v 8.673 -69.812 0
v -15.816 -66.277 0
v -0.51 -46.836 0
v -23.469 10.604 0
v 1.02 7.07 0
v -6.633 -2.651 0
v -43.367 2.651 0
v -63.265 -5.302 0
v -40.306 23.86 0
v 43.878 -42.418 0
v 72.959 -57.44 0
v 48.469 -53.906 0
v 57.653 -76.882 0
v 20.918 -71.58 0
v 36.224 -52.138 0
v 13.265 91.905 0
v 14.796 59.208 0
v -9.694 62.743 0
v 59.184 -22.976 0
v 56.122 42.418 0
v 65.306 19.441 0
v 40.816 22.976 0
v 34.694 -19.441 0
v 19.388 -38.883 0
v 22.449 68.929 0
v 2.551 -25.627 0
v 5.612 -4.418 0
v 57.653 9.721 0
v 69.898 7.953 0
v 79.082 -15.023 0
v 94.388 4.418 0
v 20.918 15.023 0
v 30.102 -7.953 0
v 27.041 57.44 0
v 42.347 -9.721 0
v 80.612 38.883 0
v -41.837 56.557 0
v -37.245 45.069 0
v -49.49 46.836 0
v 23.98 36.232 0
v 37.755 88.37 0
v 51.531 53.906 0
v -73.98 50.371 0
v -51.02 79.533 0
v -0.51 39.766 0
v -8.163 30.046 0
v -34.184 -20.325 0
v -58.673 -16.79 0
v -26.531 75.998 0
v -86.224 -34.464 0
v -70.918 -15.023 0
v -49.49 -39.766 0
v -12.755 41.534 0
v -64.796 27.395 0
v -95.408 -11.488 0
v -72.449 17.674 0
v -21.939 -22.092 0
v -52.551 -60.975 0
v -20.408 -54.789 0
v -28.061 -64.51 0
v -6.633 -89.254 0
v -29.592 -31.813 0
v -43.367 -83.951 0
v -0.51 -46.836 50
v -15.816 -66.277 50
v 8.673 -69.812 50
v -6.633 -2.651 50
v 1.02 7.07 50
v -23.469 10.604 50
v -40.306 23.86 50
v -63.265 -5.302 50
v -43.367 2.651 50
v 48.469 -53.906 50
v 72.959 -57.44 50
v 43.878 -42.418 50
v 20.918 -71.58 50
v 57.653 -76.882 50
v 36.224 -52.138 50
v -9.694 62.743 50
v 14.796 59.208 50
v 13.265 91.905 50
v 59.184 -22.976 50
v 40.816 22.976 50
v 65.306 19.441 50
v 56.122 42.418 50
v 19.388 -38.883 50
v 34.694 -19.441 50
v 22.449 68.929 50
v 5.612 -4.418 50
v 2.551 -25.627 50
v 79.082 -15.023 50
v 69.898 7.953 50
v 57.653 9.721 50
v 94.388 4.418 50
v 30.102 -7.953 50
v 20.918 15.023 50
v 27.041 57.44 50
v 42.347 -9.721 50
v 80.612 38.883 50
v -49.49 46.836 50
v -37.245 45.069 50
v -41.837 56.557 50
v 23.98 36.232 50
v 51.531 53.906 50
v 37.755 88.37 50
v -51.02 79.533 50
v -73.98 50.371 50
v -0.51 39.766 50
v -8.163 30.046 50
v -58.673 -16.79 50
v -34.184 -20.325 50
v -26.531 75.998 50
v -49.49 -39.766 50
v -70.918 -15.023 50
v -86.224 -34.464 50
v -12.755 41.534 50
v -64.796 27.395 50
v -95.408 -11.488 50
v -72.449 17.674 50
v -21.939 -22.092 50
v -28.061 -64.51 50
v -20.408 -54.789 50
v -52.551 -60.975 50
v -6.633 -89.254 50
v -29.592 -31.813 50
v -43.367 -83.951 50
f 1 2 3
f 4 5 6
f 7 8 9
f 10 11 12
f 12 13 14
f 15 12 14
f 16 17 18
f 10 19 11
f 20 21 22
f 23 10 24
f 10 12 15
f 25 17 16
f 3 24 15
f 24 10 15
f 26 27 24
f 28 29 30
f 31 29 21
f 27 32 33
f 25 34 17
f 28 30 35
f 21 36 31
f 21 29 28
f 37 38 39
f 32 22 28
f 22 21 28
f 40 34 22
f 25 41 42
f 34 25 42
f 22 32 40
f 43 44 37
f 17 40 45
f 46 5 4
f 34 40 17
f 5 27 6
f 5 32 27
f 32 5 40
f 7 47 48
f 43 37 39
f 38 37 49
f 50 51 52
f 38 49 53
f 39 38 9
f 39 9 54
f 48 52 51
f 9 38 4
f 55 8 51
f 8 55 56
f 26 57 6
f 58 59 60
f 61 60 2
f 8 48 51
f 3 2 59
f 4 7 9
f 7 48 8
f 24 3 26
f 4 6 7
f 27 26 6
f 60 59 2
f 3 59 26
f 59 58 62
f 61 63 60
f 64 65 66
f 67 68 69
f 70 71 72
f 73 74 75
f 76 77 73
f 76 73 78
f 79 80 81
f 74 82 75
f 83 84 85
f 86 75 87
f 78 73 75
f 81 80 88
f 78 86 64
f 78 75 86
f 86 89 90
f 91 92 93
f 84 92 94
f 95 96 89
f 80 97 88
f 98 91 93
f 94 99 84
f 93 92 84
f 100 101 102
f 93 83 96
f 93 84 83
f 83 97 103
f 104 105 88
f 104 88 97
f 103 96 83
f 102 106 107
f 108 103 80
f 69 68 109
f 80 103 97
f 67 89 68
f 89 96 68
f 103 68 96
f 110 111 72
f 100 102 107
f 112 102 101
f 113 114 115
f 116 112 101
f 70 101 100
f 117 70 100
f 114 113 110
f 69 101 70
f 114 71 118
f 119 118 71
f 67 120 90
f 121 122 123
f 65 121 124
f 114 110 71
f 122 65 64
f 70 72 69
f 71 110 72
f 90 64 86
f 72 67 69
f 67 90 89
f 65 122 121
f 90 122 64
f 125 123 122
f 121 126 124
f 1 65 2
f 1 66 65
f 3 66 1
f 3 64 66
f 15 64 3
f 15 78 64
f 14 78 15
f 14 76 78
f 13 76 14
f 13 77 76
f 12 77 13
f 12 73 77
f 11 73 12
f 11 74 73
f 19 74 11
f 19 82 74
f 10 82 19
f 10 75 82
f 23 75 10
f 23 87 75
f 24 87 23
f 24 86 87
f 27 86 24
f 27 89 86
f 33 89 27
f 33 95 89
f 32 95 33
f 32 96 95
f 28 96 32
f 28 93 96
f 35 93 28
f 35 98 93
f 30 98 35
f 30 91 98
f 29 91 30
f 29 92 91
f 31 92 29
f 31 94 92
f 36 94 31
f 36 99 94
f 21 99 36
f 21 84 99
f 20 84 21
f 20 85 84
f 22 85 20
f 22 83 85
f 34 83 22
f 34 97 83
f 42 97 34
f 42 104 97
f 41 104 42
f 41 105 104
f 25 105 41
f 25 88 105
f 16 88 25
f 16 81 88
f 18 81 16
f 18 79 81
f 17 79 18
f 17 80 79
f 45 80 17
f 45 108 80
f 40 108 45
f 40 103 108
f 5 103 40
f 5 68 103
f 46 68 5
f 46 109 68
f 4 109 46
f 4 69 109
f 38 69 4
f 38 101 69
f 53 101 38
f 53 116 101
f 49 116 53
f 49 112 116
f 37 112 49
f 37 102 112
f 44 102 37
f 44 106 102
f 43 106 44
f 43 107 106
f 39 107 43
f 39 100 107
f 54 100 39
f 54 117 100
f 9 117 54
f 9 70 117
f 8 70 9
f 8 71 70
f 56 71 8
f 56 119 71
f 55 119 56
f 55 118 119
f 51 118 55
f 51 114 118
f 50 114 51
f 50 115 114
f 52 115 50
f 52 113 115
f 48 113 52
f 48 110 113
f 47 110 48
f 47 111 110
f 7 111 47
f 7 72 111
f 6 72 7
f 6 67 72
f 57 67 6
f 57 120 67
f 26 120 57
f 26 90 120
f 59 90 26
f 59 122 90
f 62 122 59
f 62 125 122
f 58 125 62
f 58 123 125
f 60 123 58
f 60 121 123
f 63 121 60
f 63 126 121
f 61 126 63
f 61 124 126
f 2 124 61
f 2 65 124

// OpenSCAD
linear_extrude(height = 50) {
	polygon(paths = [[0, 1, 2, 3, 4, 5, 6, 7, 8, 9, 10, 11, 12, 13, 14, 15, 16, 17, 18, 19, 20, 21, 22, 23, 24, 25, 26, 27, 28, 29, 30, 31, 32, 33, 34, 35, 36, 37, 38, 39, 40, 41, 42, 43, 44, 45, 46, 47, 48, 49, 50, 51, 52, 53, 54, 55, 56, 57, 58, 59, 60, 61, 62, 63, 64, 65, 66, 67, 68, 69, 70, 71, 72, 73, 74, 75, 76, 77, 78, 79, 80, 81, 82, 83, 84, 85, 86, 87, 88, 89, 90, 91, 92, 93, 94, 95, 96, 97, 98, 99, 100, 101, 102, 103, 104, 105, 106, 107, 108, 109, 110, 111, 112, 113, 114, 115, 116, 117, 118, 119, 120, 121, 122, 123, 124, 125, 126, 127, 128, 129, 130, 131, 132, 133, 134, 135, 136, 137, 138, 139, 140, 141, 142, 143, 144, 145, 146]], points = [[50.0, 0.0], [42.34693877551021, -9.720693307784508], [66.83673469387755, -13.255490874251604], [66.83673469387755, -13.255490874251604], [79.0816326530612, -15.02288965748515], [69.89795918367345, 7.953294524550962], [82.14285714285711, 6.185895741317415], [82.14285714285712, 6.185895741317415], [94.3877551020408, 4.418496958083866], [85.20408163265304, 27.394681140119985], [85.20408163265304, 27.394681140119985], [80.61224489795917, 38.882773231138046], [65.3061224489796, 19.441386615569023], [60.71428571428572, 30.929478706587084], [60.7142857142857, 30.929478706587094], [56.12244897959183, 42.41757079760515], [40.816326530612244, 22.97618418203613], [36.22448979591837, 34.46427627305419], [36.22448979591837, 34.46427627305419], [27.04081632653062, 57.4404604550903], [39.28571428571429, 55.67306167185676], [39.28571428571429, 55.67306167185676], [51.530612244897966, 53.90566288862322], [42.3469387755102, 76.88184707065933], [42.3469387755102, 76.88184707065933], [37.75510204081633, 88.3699391616774], [22.448979591836743, 68.92855254610836], [17.857142857142865, 80.41664463712644], [17.857142857142865, 80.41664463712644], [13.265306122448992, 91.9047367281445], [-2.0408163265305976, 72.46335011257547], [-2.0408163265305976, 72.46335011257547], [-9.69387755102039, 62.74265680479096], [14.795918367346944, 59.207859238323856], [7.142857142857151, 49.48716593053935], [7.142857142857151, 49.48716593053934], [-0.5102040816326425, 39.766472622754826], [23.97959183673469, 36.231675056287735], [16.3265306122449, 26.51098174850322], [16.3265306122449, 26.51098174850322], [1.0204081632653128, 7.0695951329341975], [-3.5714285714285614, 18.557687223952257], [-3.5714285714285614, 18.55768722395226], [-8.163265306122442, 30.04577931497032], [-23.469387755102026, 10.604392699401293], [-28.061224489795904, 22.092484790419356], [-28.061224489795904, 22.092484790419356], [-37.24489795918367, 45.068668972455484], [-24.999999999999993, 43.30127018922193], [-24.99999999999999, 43.30127018922194], [-12.755102040816329, 41.533871405988386], [-21.938775510204067, 64.5100555880245], [-21.938775510204067, 64.5100555880245], [-26.530612244897945, 75.99814767904256], [-41.83673469387752, 56.55676106347354], [-46.428571428571395, 68.0448531544916], [-46.4285714285714, 68.0448531544916], [-51.02040816326527, 79.53294524550967], [-66.32653061224487, 60.09155862994064], [-66.32653061224487, 60.09155862994064], [-73.97959183673466, 50.37086532215614], [-49.48979591836733, 46.836067755689044], [-57.14285714285713, 37.115374447904536], [-57.14285714285712, 37.1153744479045], [-64.79591836734693, 27.394681140120014], [-40.306122448979586, 23.85988357365291], [-47.95918367346938, 14.1391902658684], [-47.95918367346938, 14.1391902658684], [-63.26530612244897, -5.302196349700616], [-67.85714285714285, 6.185895741317443], [-67.85714285714285, 6.185895741317443], [-72.44897959183673, 17.673987832335502], [-87.75510204081631, -1.7673987832335203], [-87.75510204081631, -1.7673987832335203], [-95.4081632653061, -11.488092091018027], [-70.91836734693877, -15.022889657485127], [-78.57142857142857, -24.743582965269646], [-78.57142857142857, -24.74358296526965], [-86.22448979591837, -34.46427627305415], [-61.73469387755103, -37.99907383952126], [-61.73469387755103, -37.99907383952126], [-49.489795918367356, -39.766472622754804], [-58.673469387755105, -16.790288440718687], [-46.42857142857144, -18.55768722395224], [-46.42857142857142, -18.557687223952232], [-34.18367346938776, -20.32508600718578], [-43.3673469387755, 2.651098174850336], [-31.122448979591834, 0.8836993916167823], [-31.122448979591834, 0.8836993916167823], [-6.632653061224497, -2.6510981748503175], [-14.285714285714294, -12.371791482634825], [-14.285714285714295, -12.371791482634826], [-21.93877551020409, -22.09248479041934], [2.551020408163249, -25.62728235688644], [-5.102040816326547, -35.34797566467095], [-5.102040816326547, -35.34797566467095], [-20.408163265306143, -54.789362280239985], [-25.00000000000001, -43.30127018922192], [-25.00000000000002, -43.30127018922192], [-29.591836734693892, -31.813178098203863], [-44.897959183673485, -51.254564713772865], [-44.897959183673485, -51.254564713772865], [-52.551020408163275, -60.97525802155738], [-28.06122448979595, -64.51005558802447], [-35.714285714285744, -74.23074889580899], [-35.71428571428575, -74.230748895809], [-43.367346938775555, -83.9514422035935], [-18.877551020408216, -87.4862397700606], [-18.877551020408216, -87.4862397700606], [-6.632653061224541, -89.25363855329415], [-15.816326530612287, -66.27745437125805], [-3.57142857142862, -68.0448531544916], [-3.571428571428603, -68.04485315449158], [8.673469387755068, -69.81225193772515], [-0.5102040816326758, -46.83606775568903], [11.734693877550992, -48.60346653892259], [11.734693877550992, -48.60346653892259], [36.22448979591832, -52.13826410538969], [28.57142857142853, -61.858957413174195], [28.57142857142853, -61.858957413174195], [20.918367346938734, -71.57965072095871], [45.40816326530607, -75.11444828742582], [45.40816326530607, -75.11444828742582], [57.65306122448973, -76.88184707065938], [48.469387755102, -53.905662888623255], [60.714285714285666, -55.67306167185679], [60.714285714285666, -55.67306167185679], [72.95918367346934, -57.44046045509036], [63.7755102040816, -34.46427627305423], [63.7755102040816, -34.46427627305423], [59.183673469387735, -22.976184182036175], [43.87755102040813, -42.41757079760518], [39.28571428571426, -30.929478706587123], [39.28571428571425, -30.929478706587116], [34.693877551020385, -19.441386615569055], [19.38775510204079, -38.88277323113807], [14.795918367346921, -27.394681140120003], [14.795918367346921, -27.394681140120003], [5.612244897959181, -4.418496958083882], [17.85714285714285, -6.185895741317437], [17.85714285714285, -6.185895741317438], [30.102040816326525, -7.953294524550991], [20.918367346938783, 15.022889657485136], [33.16326530612245, 13.255490874251583], [33.16326530612245, 13.255490874251583], [57.6530612244898, 9.720693307784476], [49.999999999999986, -3.3306690738754696e-14]]);
}
